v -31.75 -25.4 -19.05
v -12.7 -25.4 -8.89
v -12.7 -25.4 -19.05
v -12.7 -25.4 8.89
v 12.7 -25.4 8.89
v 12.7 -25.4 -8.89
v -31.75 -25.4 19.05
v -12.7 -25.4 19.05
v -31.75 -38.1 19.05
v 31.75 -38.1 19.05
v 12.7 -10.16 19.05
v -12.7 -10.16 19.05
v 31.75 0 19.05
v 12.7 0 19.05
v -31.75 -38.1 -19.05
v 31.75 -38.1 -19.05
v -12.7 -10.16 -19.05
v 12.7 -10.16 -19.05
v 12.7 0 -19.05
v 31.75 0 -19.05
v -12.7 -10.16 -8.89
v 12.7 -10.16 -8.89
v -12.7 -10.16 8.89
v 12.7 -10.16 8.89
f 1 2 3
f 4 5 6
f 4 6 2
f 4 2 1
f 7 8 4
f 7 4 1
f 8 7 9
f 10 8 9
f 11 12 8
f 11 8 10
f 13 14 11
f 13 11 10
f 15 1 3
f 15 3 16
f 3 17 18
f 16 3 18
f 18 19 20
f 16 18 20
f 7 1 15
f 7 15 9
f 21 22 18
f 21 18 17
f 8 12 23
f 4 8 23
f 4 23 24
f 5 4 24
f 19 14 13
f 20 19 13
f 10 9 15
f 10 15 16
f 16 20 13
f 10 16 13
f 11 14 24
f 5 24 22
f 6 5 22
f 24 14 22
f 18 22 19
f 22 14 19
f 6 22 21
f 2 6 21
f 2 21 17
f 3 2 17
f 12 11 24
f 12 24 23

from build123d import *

# Parameters (mm, degrees)
F0_W     = 63.5
F0_H     = 38.1
F1_DEPTH = 38.1
F2_W     = 25.4
F2_H     = 10.16
F3_DEPTH = 10.16
F5_DEPTH = 25.4


with BuildPart() as f1:
    # F0 (on Front) → F1 (new body)
    with BuildSketch(Plane.XZ):
        Rectangle(F0_W, F0_H)
    extrude(amount=F1_DEPTH)

    # F2 (on face) → F3 (cut)
    with BuildSketch(Plane(origin=(0, 0, 0), x_dir=(-1, 0, 0), z_dir=(0, 1, 0))):
        with Locations((0, 13.97)):
            Rectangle(F2_W, F2_H)
        with Locations((0, -13.97)):
            Rectangle(F2_W, F2_H)
    extrude(amount=-F3_DEPTH, mode=Mode.SUBTRACT)

    # F4 (on face) → F5 (cut)
    with BuildSketch(Plane(origin=(0, 0, 0), x_dir=(-1, 0, 0), z_dir=(0, 1, 0))):
        Polygon((31.75, -19.05), (31.75, 19.05), (12.7, 19.05), (12.7, 8.89), (-12.7, 8.89), (-12.7, -8.89), (12.7, -8.89), (12.7, -19.05), align=None)
    extrude(amount=-F5_DEPTH, mode=Mode.SUBTRACT)


solid = f1.part
